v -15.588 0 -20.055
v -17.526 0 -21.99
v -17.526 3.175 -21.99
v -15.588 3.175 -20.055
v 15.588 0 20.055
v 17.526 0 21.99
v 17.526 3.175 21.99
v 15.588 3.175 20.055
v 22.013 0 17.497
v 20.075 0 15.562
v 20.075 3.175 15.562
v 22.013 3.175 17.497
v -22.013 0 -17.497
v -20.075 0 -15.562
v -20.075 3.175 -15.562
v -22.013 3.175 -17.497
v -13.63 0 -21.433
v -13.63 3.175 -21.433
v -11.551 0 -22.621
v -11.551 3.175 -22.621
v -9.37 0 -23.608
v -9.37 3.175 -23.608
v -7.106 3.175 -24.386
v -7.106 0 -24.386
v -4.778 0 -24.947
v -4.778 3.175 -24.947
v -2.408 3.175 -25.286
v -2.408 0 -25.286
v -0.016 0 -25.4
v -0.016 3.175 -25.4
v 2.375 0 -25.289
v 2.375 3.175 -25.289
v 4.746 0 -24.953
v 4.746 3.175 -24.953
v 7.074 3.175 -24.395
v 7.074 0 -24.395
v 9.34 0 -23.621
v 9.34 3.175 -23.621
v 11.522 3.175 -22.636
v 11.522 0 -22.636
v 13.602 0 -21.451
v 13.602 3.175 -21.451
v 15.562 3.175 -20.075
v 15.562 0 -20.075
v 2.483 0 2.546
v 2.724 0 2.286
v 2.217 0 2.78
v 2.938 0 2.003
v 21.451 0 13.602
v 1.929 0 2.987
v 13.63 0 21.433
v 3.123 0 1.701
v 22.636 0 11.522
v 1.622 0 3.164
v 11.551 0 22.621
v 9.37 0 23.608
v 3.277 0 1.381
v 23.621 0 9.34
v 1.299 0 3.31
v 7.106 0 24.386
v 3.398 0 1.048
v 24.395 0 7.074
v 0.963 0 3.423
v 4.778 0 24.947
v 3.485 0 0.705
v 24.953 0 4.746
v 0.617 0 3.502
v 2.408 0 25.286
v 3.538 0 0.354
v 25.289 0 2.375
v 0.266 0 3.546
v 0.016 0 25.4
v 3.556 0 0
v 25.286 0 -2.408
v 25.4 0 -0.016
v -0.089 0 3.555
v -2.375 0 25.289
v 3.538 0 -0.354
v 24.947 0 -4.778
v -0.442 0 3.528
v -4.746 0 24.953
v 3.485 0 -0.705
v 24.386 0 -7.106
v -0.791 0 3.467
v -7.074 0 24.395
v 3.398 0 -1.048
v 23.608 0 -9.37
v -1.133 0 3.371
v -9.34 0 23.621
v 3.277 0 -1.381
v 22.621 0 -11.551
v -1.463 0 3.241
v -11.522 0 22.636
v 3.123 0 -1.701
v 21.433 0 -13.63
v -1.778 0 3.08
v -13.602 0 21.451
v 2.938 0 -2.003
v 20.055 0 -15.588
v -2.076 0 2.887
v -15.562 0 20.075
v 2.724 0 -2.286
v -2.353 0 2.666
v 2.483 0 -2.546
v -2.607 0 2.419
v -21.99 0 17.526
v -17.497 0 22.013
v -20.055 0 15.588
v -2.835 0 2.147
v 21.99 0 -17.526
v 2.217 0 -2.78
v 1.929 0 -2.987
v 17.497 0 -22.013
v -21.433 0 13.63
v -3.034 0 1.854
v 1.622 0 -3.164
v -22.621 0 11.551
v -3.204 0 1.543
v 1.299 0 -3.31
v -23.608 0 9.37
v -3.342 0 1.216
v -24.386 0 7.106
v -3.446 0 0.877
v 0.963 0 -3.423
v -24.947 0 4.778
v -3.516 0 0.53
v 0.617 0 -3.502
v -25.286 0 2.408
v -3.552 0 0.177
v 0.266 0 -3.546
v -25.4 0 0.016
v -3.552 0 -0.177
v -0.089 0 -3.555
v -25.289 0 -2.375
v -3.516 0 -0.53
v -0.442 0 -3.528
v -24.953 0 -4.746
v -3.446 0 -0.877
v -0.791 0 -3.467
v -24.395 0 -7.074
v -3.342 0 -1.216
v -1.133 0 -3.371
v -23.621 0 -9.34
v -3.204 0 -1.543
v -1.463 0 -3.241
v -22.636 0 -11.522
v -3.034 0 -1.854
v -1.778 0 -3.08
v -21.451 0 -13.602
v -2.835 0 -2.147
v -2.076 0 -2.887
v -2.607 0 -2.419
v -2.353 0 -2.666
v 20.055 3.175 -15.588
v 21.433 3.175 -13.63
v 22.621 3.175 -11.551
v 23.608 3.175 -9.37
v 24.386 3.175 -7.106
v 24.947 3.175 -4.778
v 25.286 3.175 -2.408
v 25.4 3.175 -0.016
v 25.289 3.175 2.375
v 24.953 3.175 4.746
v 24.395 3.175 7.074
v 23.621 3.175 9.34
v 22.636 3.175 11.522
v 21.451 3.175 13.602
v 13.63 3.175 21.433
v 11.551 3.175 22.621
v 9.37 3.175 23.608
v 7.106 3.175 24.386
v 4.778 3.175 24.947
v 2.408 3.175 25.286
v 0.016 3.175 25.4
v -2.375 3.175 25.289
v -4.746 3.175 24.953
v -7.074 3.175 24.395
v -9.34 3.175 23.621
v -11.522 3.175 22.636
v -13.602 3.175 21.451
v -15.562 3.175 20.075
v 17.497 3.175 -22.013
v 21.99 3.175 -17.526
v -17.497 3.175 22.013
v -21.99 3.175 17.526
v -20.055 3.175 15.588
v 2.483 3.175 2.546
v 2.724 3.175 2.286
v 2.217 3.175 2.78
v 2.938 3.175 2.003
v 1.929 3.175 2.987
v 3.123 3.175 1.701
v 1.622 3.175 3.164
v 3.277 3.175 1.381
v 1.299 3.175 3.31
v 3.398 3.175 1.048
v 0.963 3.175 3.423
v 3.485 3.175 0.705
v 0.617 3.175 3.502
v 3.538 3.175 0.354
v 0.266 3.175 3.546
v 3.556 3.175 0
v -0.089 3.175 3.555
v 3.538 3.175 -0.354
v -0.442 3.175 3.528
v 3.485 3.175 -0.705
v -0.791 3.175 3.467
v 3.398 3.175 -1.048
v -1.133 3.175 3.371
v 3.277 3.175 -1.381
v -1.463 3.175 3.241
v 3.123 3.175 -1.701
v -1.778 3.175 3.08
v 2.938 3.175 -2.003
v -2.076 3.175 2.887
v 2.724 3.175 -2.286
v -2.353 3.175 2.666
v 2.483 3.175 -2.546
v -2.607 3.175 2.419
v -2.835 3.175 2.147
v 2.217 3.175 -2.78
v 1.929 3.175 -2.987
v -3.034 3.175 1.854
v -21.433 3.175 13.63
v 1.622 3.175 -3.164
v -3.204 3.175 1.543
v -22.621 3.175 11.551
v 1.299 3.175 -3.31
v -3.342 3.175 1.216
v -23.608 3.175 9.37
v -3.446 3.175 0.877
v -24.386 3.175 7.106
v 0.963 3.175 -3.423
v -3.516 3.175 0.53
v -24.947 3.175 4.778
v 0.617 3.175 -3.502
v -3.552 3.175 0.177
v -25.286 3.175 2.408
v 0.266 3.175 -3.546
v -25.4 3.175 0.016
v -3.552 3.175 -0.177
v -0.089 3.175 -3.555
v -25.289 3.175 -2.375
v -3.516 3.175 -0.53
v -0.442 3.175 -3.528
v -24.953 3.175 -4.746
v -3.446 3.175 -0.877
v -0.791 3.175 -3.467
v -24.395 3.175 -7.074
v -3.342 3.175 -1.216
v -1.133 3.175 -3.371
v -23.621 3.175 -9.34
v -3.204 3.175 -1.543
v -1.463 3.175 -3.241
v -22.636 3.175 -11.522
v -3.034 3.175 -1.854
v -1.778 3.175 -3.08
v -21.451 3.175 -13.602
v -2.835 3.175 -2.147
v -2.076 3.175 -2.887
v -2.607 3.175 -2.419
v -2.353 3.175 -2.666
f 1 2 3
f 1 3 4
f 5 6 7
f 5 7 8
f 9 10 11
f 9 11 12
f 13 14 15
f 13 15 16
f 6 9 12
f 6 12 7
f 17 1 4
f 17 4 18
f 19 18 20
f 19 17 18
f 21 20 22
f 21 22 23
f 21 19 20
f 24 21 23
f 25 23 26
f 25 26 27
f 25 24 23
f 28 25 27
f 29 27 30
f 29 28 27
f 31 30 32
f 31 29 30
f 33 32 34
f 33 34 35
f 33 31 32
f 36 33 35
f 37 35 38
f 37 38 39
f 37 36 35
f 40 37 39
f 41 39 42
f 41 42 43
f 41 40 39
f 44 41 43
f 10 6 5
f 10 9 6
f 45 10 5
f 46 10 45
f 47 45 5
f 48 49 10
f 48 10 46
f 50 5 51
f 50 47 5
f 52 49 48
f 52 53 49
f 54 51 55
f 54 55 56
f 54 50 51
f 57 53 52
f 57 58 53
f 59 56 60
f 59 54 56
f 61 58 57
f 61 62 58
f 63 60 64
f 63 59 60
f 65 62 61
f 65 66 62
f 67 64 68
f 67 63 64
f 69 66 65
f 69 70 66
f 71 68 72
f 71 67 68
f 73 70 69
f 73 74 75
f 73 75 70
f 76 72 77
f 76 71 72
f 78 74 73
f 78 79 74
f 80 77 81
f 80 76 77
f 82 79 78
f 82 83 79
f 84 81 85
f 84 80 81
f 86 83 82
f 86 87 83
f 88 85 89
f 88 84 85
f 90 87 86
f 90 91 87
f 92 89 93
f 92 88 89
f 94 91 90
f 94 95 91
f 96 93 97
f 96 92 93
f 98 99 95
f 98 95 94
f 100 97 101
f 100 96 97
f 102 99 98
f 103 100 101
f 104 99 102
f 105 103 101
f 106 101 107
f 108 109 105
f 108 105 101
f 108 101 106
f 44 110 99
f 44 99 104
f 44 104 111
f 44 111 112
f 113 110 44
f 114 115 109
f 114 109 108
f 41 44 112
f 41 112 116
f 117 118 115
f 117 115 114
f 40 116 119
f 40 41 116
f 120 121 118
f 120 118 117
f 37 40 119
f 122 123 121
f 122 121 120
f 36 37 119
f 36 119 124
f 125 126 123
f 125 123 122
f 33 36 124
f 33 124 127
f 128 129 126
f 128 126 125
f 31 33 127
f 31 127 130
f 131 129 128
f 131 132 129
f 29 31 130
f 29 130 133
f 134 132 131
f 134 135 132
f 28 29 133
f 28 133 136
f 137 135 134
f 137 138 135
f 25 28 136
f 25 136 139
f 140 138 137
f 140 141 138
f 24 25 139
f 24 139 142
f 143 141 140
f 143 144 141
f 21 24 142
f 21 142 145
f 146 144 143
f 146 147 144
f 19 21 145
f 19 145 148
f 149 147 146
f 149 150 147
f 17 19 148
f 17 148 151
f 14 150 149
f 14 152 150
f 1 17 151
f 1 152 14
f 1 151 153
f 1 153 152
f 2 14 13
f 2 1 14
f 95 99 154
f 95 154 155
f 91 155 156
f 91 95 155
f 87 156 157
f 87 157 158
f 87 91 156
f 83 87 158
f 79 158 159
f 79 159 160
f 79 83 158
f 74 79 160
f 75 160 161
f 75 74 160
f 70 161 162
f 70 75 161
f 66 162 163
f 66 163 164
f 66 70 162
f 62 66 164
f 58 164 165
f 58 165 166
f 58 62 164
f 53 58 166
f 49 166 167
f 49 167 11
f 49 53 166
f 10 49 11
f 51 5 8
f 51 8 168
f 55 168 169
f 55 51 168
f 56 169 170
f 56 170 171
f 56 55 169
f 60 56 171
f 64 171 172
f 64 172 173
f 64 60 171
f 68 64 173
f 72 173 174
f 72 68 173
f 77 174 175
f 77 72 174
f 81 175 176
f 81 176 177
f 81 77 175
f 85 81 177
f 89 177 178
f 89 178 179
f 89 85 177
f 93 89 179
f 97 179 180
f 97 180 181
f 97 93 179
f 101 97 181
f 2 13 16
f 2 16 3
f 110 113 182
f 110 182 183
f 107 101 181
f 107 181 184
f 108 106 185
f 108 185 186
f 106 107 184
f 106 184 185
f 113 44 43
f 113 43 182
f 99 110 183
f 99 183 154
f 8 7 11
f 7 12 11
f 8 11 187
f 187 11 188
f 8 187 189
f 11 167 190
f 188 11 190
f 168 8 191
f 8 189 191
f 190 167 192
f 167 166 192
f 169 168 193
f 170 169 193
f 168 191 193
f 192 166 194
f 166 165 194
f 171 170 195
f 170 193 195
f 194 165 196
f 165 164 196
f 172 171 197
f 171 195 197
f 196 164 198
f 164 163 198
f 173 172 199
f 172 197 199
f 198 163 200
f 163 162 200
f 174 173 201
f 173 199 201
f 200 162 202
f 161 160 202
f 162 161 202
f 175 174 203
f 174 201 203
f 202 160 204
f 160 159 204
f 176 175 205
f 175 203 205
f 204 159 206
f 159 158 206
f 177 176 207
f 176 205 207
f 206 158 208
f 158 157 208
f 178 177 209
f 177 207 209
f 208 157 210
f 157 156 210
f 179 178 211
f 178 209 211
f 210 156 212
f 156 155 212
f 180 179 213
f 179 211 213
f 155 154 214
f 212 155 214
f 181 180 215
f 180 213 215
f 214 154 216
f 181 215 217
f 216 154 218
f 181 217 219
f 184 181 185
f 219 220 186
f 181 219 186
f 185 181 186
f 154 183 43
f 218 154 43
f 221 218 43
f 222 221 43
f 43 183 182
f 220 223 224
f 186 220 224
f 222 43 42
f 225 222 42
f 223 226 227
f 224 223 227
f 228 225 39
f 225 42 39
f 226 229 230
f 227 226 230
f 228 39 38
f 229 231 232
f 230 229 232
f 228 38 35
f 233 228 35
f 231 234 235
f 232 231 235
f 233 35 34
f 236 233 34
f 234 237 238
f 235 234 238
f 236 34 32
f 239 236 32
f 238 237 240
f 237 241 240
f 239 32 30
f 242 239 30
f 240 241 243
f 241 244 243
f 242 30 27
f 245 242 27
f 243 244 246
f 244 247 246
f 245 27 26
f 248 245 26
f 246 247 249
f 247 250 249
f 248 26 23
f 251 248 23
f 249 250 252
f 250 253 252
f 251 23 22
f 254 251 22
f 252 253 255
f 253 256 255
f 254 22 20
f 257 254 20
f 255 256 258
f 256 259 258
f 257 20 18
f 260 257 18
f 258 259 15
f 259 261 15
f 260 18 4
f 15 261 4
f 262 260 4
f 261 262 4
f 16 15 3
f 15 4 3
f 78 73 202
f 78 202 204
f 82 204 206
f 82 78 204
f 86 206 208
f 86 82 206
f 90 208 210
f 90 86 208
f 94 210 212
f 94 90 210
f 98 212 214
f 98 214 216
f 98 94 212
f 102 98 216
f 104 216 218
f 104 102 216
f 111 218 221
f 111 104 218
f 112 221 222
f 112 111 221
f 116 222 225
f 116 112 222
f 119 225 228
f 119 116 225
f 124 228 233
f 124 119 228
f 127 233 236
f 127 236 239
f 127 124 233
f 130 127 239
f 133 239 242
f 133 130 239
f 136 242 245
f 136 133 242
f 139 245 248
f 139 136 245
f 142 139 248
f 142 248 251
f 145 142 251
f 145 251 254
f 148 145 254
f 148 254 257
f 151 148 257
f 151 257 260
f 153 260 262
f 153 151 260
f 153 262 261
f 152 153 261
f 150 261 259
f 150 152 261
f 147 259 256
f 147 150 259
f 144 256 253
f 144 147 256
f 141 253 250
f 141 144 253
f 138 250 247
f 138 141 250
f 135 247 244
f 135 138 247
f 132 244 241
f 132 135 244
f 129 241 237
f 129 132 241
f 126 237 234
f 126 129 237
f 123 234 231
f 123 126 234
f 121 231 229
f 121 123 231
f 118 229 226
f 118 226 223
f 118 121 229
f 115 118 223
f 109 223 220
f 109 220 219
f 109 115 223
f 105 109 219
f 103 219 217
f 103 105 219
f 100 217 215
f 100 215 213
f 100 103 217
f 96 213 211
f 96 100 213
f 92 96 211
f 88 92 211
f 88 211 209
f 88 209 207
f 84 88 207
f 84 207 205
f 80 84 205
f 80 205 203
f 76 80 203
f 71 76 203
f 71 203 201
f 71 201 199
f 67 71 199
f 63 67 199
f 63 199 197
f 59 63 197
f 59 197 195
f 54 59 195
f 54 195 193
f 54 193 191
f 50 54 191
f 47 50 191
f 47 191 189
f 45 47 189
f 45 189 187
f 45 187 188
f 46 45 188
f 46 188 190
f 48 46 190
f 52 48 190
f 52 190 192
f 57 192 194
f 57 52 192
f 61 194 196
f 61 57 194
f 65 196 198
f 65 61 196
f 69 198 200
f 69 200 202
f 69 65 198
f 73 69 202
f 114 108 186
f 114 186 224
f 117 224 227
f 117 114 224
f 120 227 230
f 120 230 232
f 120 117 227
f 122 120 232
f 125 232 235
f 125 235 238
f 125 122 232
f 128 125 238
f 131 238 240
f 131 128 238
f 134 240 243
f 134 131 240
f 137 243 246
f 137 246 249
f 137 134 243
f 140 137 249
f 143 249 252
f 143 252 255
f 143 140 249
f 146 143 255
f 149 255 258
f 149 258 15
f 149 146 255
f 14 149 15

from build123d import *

# Parameters (mm, degrees)
SKETCH1_R           = 3.556
BOSS_EXTRUDE1_DEPTH = 3.175


with BuildPart() as part:
    # Sketch1 → Boss-Extrude1 (new body)
    with BuildSketch(Plane(origin=(0, 0, 0), x_dir=(1, 0, 0), z_dir=(0, 1, 0))):
        with BuildLine():
            Line((17.525786369, -21.990248683), (15.587608536, -20.05458701))
            ThreePointArc((15.587608536, -20.05458701), (0.016497958, -25.399994642), (-15.561543442, -20.074819195))
            Line((-15.561543442, -20.074819195), (-17.497205115, -22.012997028))
            Line((-17.497205115, -22.012997028), (-21.990248683, -17.525786369))
            Line((-21.990248683, -17.525786369), (-20.05458701, -15.587608536))
            ThreePointArc((-20.05458701, -15.587608536), (-25.399994642, -0.016497958), (-20.074819195, 15.561543442))
            Line((-20.074819195, 15.561543442), (-22.012997028, 17.497205115))
            Line((-22.012997028, 17.497205115), (-17.525786369, 21.990248683))
            Line((-17.525786369, 21.990248683), (-15.587608536, 20.05458701))
            ThreePointArc((-15.587608536, 20.05458701), (-0.016497958, 25.399994642), (15.561543442, 20.074819195))
            Line((15.561543442, 20.074819195), (17.497205115, 22.012997028))
            Line((17.497205115, 22.012997028), (21.990248683, 17.525786369))
            Line((21.990248683, 17.525786369), (20.05458701, 15.587608536))
            ThreePointArc((20.05458701, 15.587608536), (25.399994642, 0.016497958), (20.074819195, -15.561543442))
            Line((20.074819195, -15.561543442), (22.012997028, -17.497205115))
            Line((22.012997028, -17.497205115), (17.525786369, -21.990248683))
        make_face()
        Circle(SKETCH1_R, mode=Mode.SUBTRACT)
    extrude(amount=BOSS_EXTRUDE1_DEPTH)


solid = part.part
